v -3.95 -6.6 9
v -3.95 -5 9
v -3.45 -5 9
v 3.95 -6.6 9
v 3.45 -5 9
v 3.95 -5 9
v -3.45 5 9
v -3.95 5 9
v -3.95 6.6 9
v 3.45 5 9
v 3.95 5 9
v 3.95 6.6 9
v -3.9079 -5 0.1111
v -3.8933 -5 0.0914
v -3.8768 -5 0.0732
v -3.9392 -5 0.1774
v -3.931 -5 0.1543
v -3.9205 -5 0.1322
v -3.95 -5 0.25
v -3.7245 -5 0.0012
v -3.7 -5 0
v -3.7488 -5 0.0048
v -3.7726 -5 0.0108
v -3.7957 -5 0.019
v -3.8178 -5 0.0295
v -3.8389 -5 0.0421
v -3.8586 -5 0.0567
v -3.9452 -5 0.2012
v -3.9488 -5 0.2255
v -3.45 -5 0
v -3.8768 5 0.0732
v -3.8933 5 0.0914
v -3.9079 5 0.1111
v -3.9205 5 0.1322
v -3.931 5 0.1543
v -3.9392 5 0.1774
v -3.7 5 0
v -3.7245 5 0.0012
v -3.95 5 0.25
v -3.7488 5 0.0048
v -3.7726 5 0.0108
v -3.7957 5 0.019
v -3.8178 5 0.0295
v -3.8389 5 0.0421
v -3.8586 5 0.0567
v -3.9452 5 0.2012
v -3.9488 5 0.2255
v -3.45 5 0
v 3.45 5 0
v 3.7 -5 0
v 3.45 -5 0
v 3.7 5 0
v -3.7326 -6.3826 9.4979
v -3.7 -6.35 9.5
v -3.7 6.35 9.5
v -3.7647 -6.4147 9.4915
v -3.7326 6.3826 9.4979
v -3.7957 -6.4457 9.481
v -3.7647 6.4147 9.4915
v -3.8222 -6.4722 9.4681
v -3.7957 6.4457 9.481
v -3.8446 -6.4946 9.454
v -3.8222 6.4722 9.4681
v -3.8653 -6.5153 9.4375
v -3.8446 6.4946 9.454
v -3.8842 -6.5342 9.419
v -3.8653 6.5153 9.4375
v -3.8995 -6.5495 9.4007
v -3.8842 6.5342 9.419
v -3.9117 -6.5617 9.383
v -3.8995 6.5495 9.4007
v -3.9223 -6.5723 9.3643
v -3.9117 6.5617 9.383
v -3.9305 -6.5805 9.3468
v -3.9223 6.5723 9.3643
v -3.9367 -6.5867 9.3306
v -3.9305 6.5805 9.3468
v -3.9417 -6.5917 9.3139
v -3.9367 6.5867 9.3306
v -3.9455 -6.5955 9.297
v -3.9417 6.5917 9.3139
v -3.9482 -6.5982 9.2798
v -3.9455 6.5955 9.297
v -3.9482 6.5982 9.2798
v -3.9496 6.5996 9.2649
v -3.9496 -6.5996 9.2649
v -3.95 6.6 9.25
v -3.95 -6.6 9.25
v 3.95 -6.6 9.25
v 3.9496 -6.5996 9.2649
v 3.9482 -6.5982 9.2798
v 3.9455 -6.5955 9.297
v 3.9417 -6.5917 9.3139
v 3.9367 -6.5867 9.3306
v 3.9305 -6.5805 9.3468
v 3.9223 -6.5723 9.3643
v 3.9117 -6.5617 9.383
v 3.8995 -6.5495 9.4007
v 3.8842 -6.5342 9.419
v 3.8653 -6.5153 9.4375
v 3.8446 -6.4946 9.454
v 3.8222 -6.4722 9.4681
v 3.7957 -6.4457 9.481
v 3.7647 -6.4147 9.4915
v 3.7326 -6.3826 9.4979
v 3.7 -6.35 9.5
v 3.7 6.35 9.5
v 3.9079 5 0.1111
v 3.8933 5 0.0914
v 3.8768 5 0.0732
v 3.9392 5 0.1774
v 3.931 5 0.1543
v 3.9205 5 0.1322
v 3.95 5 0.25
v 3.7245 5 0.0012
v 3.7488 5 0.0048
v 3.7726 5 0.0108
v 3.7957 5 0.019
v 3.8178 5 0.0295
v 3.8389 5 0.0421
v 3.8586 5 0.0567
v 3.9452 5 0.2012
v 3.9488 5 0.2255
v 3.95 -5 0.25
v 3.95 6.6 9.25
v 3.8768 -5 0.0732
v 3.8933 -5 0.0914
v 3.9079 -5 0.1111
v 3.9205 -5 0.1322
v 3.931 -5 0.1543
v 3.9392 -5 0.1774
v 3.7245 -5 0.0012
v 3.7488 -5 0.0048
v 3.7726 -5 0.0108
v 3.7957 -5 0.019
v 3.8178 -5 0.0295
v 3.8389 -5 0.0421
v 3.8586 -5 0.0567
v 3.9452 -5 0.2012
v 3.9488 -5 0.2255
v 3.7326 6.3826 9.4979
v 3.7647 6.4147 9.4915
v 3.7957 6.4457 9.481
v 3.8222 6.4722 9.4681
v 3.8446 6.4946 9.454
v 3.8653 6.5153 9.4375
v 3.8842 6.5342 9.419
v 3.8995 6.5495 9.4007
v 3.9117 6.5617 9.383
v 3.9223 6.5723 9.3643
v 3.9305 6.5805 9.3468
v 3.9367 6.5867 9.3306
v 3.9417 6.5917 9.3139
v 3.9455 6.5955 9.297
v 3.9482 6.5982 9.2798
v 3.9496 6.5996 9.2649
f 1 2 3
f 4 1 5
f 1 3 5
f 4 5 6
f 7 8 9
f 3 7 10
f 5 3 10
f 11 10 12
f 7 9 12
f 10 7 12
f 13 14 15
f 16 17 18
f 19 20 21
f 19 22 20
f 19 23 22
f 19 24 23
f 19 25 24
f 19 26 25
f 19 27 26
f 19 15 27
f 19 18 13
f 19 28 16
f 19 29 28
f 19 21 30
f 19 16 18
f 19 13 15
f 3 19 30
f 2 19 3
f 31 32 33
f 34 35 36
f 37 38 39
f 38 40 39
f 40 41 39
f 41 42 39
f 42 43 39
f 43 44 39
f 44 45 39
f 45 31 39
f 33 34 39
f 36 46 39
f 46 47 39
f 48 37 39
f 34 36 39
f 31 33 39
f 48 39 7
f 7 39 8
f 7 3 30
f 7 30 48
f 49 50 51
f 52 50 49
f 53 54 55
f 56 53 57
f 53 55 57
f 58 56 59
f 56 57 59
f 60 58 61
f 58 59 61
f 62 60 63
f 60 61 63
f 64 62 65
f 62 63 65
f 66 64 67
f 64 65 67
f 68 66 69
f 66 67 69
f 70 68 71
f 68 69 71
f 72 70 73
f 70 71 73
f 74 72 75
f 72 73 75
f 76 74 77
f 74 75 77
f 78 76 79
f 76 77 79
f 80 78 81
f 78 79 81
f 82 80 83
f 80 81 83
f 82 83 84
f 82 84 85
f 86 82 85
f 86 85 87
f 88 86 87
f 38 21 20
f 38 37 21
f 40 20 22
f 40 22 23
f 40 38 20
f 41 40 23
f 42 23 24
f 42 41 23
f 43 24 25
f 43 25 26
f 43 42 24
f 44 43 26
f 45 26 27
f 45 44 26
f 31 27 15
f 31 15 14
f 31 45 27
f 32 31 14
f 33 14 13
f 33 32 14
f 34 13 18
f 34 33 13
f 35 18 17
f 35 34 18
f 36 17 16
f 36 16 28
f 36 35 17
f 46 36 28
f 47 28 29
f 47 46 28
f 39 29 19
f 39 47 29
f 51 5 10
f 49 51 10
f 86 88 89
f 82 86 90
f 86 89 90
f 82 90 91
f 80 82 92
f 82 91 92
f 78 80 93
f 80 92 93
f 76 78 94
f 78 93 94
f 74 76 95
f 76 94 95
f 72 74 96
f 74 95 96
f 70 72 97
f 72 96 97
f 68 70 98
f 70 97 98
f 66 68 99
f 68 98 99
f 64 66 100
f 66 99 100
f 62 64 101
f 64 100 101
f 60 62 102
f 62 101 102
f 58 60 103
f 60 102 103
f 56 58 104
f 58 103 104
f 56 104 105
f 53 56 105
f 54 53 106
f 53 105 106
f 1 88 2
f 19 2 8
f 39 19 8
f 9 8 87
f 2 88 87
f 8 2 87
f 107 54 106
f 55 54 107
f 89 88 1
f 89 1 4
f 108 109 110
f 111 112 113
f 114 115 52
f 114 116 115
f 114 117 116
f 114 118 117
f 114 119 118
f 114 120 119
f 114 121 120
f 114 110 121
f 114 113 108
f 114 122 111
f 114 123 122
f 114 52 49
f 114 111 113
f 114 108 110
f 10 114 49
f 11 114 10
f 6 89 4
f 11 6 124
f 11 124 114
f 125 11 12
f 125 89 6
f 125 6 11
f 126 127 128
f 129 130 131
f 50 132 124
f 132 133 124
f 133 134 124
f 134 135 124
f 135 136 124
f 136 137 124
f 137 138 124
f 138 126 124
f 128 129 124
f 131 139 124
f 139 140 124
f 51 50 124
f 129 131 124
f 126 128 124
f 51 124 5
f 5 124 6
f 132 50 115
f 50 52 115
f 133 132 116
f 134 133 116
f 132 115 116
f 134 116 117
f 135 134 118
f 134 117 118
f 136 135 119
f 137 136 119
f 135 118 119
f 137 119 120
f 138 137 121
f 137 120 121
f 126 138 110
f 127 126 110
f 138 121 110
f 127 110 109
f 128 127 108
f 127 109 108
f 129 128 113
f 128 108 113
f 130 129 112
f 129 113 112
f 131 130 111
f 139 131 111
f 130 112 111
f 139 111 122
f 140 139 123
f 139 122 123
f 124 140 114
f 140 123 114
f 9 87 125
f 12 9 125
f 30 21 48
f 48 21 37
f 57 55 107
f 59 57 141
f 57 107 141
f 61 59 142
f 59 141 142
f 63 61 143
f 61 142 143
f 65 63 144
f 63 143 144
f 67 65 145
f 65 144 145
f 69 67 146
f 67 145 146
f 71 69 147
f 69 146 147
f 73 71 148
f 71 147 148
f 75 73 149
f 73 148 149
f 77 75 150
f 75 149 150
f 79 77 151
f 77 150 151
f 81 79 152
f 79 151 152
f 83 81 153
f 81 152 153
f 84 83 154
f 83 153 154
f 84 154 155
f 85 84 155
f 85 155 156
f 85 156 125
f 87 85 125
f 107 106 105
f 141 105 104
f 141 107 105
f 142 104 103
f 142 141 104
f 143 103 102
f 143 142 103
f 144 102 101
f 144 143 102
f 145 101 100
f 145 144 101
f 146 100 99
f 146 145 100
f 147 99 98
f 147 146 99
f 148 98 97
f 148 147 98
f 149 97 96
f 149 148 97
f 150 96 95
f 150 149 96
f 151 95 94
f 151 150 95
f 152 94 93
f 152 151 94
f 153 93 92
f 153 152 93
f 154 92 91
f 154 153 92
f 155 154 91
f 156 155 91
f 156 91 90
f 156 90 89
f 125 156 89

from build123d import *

# Parameters (mm, degrees)
SKETCH006_W  = 10
SKETCH006_H  = 9.5
PAD002_DEPTH = 0.5
SKETCH007_W  = 7.9
SKETCH007_H  = 13.2
PAD003_DEPTH = 0.5
SKETCH008_W  = 10
SKETCH008_H  = 9.5
PAD004_DEPTH = 0.5
FILLET_R     = 0.25


with BuildPart() as part:
    # Sketch006 → Pad002 (new body)
    with BuildSketch(Plane.YZ.offset(3.95)):
        with Locations((0, 4.75)):
            Rectangle(SKETCH006_W, SKETCH006_H)
    extrude(amount=-PAD002_DEPTH)

    # Sketch007 → Pad003 (join)
    with BuildSketch(Plane.XY.offset(9.5)):
        Rectangle(SKETCH007_W, SKETCH007_H)
    extrude(amount=-PAD003_DEPTH)

    # Sketch008 → Pad004 (join)
    with BuildSketch(Plane.YZ.offset(-3.95)):
        with Locations((0, 4.75)):
            Rectangle(SKETCH008_W, SKETCH008_H)
    extrude(amount=PAD004_DEPTH)

    # Fillet
    fillet_edges = [part.edges().sort_by_distance(p)[0] for p in [
        (3.95, 0, 9.5),
        (0, 6.6, 9.5),
        (-3.95, 0, 9.5),
        (0, -6.6, 9.5),
        (3.95, 0, 0),
        (-3.95, 0, 0),
    ]]
    fillet(fillet_edges, radius=FILLET_R)


solid = part.part
